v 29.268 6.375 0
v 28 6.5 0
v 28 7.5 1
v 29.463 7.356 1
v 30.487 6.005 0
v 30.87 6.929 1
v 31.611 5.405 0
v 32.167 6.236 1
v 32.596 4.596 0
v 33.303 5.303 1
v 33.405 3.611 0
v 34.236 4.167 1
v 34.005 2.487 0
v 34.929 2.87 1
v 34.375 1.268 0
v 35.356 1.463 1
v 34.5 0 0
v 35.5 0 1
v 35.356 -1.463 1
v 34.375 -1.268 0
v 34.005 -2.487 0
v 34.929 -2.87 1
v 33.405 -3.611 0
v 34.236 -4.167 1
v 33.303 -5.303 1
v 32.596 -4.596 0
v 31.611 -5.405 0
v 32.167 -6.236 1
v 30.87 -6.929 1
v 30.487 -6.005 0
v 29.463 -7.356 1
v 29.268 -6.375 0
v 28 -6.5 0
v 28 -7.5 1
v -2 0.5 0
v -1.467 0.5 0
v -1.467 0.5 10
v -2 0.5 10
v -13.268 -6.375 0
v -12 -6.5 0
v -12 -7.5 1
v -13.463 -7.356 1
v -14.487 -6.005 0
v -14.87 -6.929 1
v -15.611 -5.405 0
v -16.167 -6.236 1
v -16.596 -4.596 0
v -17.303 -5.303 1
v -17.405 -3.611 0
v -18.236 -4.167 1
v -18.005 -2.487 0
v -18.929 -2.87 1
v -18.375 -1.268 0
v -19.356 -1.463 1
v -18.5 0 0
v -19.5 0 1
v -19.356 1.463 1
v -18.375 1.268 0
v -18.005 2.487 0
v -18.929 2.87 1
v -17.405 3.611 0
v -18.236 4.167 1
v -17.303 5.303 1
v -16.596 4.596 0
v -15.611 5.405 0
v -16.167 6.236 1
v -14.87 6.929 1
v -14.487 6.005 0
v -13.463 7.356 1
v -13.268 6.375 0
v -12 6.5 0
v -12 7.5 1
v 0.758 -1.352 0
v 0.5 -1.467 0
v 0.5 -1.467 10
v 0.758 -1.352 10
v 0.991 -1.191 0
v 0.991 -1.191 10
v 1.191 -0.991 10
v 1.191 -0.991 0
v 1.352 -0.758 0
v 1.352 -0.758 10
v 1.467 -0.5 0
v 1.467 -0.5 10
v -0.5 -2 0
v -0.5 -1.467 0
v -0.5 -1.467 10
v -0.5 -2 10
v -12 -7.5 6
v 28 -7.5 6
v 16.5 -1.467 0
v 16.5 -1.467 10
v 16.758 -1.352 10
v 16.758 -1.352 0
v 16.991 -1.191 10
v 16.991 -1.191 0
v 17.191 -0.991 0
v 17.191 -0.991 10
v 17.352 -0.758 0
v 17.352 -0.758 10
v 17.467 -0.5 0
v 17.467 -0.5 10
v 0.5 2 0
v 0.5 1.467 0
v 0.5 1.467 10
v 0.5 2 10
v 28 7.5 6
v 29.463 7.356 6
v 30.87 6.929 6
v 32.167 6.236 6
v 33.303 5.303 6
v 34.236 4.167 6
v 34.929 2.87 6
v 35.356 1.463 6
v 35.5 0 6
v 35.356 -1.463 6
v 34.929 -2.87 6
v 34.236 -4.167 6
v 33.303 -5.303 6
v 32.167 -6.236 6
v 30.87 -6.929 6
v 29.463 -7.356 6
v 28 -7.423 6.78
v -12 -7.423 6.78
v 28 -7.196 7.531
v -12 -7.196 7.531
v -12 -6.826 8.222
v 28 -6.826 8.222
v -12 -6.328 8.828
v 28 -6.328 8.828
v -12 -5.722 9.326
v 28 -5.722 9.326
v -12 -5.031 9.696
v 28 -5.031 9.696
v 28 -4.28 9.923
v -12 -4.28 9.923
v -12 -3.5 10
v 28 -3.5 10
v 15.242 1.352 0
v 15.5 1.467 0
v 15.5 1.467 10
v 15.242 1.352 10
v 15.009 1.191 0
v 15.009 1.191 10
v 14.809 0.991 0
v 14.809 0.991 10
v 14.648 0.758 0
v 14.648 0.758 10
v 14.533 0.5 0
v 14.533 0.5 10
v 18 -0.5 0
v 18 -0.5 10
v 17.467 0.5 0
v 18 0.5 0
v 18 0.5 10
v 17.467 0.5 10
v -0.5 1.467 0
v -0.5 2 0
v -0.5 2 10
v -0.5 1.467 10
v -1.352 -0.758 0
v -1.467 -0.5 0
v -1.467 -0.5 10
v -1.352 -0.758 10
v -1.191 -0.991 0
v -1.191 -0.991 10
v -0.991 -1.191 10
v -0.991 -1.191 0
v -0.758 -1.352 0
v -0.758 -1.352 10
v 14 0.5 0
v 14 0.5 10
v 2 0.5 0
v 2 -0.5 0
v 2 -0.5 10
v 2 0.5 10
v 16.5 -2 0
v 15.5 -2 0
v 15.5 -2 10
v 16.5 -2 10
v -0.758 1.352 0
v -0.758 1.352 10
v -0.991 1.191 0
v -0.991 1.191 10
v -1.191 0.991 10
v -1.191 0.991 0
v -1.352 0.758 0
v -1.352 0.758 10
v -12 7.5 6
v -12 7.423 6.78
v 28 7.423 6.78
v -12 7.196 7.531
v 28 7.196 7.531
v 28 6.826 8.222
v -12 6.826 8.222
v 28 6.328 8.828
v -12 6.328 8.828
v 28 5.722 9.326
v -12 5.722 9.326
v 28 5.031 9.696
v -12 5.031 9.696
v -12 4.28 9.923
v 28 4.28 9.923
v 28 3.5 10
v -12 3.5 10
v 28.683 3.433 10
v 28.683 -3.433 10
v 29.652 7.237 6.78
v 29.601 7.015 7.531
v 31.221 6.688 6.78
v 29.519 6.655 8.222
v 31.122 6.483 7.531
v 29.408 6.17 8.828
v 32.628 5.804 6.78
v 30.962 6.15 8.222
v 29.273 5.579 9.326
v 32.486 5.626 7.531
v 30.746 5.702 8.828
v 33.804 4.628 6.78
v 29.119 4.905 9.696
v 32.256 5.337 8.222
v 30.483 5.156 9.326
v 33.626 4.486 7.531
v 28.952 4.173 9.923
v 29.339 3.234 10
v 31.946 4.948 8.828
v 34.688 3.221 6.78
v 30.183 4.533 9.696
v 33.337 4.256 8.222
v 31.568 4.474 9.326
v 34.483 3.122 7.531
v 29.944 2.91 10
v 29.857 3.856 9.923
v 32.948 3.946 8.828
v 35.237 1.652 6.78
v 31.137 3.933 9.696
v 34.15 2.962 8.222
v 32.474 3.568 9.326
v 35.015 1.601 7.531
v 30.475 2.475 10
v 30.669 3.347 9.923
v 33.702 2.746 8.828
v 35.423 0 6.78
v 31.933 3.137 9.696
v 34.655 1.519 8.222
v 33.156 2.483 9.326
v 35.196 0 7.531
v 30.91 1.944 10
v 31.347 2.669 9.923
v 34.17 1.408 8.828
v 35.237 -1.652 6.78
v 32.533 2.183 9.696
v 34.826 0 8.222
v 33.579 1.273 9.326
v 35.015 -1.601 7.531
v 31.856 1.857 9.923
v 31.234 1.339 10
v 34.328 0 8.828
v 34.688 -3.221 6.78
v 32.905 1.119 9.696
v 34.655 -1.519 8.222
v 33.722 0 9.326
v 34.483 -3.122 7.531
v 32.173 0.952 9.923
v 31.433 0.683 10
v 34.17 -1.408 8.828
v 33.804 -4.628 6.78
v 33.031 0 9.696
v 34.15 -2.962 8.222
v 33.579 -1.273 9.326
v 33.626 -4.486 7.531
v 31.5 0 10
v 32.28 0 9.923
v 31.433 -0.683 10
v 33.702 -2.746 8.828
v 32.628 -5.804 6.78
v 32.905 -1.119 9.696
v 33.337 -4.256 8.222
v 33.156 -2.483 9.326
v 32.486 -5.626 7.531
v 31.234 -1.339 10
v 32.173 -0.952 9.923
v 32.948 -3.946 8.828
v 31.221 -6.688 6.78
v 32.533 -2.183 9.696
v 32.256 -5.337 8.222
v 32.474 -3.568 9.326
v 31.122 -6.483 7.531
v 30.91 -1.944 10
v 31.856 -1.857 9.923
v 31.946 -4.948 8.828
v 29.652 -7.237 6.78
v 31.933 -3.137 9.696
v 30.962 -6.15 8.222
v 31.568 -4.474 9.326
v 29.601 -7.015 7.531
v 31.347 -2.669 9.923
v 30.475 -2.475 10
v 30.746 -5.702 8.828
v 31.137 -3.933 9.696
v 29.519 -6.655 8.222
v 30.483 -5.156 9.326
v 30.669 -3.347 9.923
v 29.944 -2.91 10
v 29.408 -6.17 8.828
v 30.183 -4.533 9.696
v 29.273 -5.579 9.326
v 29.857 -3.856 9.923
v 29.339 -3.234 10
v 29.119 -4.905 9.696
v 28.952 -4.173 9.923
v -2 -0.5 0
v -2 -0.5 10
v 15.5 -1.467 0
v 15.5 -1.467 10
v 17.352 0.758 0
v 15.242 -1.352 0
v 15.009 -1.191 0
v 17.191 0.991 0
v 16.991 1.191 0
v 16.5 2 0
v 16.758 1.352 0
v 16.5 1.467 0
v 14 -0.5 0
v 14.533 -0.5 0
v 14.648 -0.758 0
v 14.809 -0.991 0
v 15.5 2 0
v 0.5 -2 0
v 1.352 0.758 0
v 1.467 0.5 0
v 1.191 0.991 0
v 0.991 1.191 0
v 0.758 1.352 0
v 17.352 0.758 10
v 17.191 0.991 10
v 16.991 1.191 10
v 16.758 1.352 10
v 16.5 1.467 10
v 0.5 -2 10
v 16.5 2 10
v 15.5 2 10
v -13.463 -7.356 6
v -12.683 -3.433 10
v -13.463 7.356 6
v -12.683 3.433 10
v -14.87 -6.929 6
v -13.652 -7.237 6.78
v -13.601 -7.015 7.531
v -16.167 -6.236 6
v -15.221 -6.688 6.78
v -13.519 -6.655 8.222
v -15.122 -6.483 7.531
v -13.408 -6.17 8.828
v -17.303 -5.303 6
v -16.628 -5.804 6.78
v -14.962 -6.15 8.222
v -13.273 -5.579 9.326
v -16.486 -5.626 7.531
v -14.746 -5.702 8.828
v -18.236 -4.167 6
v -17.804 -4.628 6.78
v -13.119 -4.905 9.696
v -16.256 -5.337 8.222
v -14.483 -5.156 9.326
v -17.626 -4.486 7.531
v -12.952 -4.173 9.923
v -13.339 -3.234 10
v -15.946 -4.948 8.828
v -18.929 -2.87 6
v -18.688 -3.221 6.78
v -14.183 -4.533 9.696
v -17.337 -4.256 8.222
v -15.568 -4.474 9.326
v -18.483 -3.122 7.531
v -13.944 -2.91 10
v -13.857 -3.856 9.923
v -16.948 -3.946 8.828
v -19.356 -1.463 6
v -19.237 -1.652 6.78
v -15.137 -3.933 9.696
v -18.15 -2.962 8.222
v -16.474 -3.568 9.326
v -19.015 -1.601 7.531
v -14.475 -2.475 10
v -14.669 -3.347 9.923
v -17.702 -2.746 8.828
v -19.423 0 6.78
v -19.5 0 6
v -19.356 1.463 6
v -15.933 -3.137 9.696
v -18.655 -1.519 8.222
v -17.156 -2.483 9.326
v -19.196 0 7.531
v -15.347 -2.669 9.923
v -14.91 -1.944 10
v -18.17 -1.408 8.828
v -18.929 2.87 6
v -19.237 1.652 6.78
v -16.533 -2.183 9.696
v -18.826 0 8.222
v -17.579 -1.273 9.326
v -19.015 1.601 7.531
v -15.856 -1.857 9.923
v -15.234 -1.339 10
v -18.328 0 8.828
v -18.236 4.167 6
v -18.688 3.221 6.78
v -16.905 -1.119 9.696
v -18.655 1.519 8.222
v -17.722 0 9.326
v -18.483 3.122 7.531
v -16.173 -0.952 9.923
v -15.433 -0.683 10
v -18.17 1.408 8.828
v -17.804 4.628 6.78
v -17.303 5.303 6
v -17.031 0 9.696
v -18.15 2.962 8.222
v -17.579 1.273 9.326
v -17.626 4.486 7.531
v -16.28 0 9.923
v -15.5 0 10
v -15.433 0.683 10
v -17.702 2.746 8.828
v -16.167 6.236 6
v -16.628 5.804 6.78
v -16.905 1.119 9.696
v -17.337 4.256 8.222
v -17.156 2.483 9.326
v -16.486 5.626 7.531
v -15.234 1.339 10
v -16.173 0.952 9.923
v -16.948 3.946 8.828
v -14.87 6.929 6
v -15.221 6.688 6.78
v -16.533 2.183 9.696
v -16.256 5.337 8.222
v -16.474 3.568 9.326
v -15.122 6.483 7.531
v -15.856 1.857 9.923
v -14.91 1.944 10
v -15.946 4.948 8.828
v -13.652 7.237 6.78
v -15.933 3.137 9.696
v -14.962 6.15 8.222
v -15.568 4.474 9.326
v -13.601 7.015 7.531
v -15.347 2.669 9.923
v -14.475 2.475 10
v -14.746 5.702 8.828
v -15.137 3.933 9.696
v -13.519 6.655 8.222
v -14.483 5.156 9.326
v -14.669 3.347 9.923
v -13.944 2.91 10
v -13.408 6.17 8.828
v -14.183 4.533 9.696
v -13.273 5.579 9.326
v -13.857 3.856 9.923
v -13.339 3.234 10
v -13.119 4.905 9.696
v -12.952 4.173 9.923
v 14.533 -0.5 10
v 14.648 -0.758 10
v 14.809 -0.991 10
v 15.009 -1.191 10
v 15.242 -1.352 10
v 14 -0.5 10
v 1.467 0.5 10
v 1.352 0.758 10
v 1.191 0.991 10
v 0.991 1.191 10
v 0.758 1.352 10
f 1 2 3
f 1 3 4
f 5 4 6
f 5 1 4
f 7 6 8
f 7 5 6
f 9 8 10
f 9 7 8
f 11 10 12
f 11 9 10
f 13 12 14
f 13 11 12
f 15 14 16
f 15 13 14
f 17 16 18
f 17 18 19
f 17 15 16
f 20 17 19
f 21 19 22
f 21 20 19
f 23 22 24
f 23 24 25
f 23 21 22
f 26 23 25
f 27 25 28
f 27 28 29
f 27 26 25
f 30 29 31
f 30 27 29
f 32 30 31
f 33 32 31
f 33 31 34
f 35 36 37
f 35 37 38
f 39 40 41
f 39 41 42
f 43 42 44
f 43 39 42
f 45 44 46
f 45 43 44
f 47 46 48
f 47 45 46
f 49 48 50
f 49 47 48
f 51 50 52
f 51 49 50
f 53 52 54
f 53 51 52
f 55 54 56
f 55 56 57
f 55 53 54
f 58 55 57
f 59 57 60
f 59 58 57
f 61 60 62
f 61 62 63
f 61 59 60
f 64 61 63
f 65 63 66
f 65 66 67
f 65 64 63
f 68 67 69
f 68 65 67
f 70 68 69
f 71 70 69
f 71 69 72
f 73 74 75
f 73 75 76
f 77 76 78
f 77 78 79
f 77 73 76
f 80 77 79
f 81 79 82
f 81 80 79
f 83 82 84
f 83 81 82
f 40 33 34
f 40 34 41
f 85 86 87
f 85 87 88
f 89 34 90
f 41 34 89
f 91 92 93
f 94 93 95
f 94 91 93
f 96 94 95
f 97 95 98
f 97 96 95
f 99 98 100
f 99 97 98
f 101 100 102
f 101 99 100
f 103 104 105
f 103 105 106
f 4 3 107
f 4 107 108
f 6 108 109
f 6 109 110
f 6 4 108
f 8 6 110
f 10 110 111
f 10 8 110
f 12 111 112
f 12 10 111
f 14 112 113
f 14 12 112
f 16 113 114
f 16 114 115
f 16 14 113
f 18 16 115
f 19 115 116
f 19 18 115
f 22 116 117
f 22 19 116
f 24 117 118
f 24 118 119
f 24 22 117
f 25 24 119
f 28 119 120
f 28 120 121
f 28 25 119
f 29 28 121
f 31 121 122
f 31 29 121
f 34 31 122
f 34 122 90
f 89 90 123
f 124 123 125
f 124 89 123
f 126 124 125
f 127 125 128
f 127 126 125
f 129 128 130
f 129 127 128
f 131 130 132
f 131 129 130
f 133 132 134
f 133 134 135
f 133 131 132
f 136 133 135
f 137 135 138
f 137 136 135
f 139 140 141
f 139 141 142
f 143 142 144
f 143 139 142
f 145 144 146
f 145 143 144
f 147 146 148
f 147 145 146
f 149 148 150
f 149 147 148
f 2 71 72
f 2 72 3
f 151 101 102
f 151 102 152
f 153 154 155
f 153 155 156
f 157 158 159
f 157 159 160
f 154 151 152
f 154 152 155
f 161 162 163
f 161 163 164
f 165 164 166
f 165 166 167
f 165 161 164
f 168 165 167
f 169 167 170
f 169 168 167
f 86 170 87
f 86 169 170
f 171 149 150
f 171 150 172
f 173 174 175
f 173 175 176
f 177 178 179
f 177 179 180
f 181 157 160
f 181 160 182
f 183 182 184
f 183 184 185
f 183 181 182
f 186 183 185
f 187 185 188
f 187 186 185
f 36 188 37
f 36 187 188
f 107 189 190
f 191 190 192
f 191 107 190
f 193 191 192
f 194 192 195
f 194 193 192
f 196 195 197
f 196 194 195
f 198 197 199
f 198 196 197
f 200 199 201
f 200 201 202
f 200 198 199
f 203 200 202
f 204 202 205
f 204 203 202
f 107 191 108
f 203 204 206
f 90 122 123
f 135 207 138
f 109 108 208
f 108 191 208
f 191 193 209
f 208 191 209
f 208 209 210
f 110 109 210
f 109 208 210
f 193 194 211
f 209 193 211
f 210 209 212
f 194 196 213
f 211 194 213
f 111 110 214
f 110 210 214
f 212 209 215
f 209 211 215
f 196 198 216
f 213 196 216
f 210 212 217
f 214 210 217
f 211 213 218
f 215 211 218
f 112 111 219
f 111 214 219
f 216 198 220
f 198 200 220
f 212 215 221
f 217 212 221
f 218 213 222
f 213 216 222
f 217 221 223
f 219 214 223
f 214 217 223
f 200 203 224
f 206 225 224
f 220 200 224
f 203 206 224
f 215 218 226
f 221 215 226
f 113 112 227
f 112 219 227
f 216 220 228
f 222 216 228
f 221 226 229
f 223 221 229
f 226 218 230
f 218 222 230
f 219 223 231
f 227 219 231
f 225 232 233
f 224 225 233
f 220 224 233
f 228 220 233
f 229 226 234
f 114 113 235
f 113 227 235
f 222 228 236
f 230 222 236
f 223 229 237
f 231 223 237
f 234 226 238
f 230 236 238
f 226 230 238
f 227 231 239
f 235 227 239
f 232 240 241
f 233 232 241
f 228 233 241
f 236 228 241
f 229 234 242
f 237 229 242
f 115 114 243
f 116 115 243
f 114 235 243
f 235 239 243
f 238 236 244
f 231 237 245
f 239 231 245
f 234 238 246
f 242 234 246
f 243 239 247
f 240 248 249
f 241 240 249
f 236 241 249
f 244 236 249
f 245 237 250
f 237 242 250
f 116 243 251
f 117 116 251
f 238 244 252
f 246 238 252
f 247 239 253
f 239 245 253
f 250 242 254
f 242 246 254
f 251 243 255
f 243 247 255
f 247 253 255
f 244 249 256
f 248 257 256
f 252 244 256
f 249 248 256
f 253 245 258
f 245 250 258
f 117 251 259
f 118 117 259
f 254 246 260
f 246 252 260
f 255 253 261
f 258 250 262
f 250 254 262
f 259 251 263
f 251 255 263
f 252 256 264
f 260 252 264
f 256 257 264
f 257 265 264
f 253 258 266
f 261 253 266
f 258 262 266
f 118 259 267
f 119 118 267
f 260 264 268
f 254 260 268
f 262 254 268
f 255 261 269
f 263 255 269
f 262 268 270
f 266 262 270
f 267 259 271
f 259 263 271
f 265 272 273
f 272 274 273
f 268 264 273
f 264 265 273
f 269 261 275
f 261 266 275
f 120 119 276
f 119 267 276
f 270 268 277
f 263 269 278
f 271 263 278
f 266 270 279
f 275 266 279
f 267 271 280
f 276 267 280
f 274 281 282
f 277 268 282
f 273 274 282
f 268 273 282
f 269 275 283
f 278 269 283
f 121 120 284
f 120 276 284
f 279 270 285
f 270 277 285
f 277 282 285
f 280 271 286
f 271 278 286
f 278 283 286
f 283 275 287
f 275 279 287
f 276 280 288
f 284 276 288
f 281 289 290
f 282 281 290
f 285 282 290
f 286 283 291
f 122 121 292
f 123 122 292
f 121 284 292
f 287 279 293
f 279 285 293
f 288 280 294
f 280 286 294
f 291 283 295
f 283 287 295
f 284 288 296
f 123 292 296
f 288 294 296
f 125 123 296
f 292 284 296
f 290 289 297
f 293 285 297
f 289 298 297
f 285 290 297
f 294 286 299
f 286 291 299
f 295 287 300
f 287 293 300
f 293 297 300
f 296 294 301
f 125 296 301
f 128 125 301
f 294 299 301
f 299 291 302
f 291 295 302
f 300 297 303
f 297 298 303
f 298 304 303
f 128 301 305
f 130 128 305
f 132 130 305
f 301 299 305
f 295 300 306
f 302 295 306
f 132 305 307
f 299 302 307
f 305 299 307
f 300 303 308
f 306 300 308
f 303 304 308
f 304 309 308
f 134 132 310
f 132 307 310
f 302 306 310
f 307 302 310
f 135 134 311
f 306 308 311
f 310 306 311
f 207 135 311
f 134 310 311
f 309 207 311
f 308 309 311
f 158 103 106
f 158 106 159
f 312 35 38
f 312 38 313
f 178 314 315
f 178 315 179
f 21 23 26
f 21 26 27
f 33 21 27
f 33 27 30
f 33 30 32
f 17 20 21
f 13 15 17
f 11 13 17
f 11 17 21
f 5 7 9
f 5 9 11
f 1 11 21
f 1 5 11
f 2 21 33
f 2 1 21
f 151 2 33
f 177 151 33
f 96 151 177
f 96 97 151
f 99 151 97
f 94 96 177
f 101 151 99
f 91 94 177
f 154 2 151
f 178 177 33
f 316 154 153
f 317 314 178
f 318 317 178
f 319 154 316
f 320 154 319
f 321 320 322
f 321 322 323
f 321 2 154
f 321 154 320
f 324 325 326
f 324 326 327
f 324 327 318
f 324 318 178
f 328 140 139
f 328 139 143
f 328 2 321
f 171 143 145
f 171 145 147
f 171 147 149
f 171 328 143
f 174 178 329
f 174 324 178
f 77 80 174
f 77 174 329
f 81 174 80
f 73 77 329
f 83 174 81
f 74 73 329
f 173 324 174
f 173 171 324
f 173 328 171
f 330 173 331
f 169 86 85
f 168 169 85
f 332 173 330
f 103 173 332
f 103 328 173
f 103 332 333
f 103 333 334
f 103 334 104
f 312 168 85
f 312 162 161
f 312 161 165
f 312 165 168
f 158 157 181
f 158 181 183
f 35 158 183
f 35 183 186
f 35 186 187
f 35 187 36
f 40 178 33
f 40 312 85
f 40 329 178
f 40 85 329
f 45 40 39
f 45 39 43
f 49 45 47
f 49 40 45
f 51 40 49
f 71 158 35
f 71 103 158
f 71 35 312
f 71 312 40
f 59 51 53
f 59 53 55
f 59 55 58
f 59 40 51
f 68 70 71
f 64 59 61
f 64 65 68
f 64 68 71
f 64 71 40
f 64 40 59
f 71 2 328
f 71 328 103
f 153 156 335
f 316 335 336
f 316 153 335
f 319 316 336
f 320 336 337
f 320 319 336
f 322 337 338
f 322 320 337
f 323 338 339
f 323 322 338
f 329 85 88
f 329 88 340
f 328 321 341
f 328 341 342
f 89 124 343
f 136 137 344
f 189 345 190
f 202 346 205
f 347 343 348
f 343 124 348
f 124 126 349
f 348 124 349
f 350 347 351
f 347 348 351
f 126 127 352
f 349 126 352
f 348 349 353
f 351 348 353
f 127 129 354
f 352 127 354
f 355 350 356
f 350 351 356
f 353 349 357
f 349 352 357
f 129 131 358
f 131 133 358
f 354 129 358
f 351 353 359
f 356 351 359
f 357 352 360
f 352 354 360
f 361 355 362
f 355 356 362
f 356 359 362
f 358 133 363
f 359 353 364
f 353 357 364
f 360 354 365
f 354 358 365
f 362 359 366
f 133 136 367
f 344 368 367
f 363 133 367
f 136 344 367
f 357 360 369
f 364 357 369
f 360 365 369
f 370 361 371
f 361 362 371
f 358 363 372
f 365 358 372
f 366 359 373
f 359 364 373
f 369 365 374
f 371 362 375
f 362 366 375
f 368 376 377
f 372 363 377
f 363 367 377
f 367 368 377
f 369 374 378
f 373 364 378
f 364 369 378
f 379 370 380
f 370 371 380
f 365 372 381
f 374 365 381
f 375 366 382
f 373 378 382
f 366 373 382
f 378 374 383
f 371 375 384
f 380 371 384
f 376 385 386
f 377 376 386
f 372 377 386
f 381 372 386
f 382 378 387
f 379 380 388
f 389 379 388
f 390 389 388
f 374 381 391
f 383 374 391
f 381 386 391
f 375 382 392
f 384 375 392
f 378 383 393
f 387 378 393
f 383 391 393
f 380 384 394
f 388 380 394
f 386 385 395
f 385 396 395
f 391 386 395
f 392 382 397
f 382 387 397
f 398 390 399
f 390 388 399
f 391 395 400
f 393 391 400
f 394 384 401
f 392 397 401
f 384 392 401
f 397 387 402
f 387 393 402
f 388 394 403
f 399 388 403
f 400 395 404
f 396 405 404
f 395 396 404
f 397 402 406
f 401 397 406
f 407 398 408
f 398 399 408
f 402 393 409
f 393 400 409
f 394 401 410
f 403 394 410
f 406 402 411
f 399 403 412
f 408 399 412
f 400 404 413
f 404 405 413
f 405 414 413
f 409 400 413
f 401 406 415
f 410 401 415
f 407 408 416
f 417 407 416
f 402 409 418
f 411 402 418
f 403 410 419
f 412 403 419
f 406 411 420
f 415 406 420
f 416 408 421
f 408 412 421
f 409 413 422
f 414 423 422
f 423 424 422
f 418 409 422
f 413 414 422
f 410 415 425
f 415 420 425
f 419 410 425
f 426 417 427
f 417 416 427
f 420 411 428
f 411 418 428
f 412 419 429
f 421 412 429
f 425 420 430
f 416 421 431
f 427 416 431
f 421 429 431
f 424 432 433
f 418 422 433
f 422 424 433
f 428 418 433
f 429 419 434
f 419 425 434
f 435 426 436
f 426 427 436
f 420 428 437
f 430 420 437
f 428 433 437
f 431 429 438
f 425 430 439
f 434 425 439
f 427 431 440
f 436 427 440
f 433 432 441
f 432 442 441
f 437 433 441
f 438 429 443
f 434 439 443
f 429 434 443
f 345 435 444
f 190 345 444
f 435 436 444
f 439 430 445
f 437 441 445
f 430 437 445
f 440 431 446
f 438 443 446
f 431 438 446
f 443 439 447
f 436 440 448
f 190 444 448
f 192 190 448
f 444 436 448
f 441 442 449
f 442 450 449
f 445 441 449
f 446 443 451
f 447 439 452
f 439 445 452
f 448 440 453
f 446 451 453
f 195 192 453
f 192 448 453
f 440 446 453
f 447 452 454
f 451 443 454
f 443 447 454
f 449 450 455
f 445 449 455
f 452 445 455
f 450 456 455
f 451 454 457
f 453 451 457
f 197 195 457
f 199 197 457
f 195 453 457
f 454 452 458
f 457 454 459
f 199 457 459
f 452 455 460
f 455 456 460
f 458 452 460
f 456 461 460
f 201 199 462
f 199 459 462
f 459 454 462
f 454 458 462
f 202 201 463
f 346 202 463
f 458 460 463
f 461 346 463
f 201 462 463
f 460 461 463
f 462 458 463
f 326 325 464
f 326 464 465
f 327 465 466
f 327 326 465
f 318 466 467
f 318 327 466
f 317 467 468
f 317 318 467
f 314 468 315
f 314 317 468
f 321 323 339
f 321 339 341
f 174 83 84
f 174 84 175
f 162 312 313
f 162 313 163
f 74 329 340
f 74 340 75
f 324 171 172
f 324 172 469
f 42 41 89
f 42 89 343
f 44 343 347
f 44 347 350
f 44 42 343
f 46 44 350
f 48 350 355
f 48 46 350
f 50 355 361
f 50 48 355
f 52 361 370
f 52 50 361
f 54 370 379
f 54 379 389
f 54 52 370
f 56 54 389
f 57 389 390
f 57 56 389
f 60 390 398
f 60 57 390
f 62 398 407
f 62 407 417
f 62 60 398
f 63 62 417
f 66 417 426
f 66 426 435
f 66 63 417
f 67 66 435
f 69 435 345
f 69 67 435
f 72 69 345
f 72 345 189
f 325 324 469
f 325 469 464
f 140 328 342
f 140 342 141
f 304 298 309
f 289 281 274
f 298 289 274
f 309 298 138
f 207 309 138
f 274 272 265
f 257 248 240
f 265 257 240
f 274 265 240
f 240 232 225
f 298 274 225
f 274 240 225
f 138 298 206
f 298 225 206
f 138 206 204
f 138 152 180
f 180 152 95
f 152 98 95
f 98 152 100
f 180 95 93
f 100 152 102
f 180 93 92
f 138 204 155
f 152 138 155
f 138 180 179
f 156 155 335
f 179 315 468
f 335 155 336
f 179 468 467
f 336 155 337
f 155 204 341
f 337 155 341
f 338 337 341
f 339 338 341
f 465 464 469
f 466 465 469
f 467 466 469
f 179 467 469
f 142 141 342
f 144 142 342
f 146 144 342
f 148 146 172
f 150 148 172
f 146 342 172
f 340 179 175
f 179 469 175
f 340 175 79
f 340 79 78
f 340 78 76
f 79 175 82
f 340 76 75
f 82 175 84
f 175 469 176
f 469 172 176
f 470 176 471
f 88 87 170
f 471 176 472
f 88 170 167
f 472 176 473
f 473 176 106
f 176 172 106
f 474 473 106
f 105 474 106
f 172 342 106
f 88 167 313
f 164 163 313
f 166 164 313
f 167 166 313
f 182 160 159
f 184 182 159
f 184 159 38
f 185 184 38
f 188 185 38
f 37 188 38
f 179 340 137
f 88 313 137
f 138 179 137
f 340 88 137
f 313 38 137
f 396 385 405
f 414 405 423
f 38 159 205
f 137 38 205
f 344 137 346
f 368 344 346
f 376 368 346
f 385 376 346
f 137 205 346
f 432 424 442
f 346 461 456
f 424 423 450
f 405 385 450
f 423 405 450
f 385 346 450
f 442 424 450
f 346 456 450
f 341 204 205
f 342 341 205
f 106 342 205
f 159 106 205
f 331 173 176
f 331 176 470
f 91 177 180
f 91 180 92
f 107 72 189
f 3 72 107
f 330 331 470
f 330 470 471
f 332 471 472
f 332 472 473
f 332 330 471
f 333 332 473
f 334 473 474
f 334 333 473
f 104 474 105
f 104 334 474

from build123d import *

# Parameters (mm, degrees)
BOSS_EXTRUDE1_DEPTH = 10
FILLET1_R           = 4
CHAMFER1_SIZE       = 1


with BuildPart() as part:
    # Sketch1 → Boss-Extrude1 (new body)
    with BuildSketch(Plane.XY):
        with BuildLine():
            Line((-12, 7.5), (28, 7.5))
            ThreePointArc((28, 7.5), (35.5, 0), (28, -7.5))
            Line((28, -7.5), (-12, -7.5))
            ThreePointArc((-12, -7.5), (-19.5, 0), (-12, 7.5))
        make_face()
        with BuildLine():
            Line((-0.5, -2), (0.5, -2))
            Line((0.5, -2), (0.5, -1.467140075))
            ThreePointArc((0.5, -1.467140075), (1.096015511, -1.096015511), (1.467140075, -0.5))
            Line((1.467140075, -0.5), (2, -0.5))
            Line((2, -0.5), (2, 0.5))
            Line((2, 0.5), (1.467140075, 0.5))
            ThreePointArc((1.467140075, 0.5), (1.096015511, 1.096015511), (0.5, 1.467140075))
            Line((0.5, 1.467140075), (0.5, 2))
            Line((0.5, 2), (-0.5, 2))
            Line((-0.5, 2), (-0.5, 1.467140075))
            ThreePointArc((-0.5, 1.467140075), (-1.096015511, 1.096015511), (-1.467140075, 0.5))
            Line((-1.467140075, 0.5), (-2, 0.5))
            Line((-2, 0.5), (-2, -0.5))
            Line((-2, -0.5), (-1.467140075, -0.5))
            ThreePointArc((-1.467140075, -0.5), (-1.096015511, -1.096015511), (-0.5, -1.467140075))
            Line((-0.5, -1.467140075), (-0.5, -2))
        make_face(mode=Mode.SUBTRACT)
        with BuildLine():
            Line((18, -0.5), (18, 0.5))
            Line((18, 0.5), (17.467140075, 0.5))
            ThreePointArc((17.467140075, 0.5), (17.096015511, 1.096015511), (16.5, 1.467140075))
            Line((16.5, 1.467140075), (16.5, 2))
            Line((16.5, 2), (15.5, 2))
            Line((15.5, 2), (15.5, 1.467140075))
            ThreePointArc((15.5, 1.467140075), (14.903984489, 1.096015511), (14.532859925, 0.5))
            Line((14.532859925, 0.5), (14, 0.5))
            Line((14, 0.5), (14, -0.5))
            Line((14, -0.5), (14.532859925, -0.5))
            ThreePointArc((14.532859925, -0.5), (14.903984489, -1.096015511), (15.5, -1.467140075))
            Line((15.5, -1.467140075), (15.5, -2))
            Line((15.5, -2), (16.5, -2))
            Line((16.5, -2), (16.5, -1.467140075))
            ThreePointArc((16.5, -1.467140075), (17.096015511, -1.096015511), (17.467140075, -0.5))
            Line((17.467140075, -0.5), (18, -0.5))
        make_face(mode=Mode.SUBTRACT)
    extrude(amount=BOSS_EXTRUDE1_DEPTH)

    # Fillet1
    fillet1_edges = [part.edges().sort_by_distance(p)[0] for p in [
        (35.5, 0, 10),
        (8, 7.5, 10),
        (-19.5, 0, 10),
        (8, -7.5, 10),
    ]]
    fillet(fillet1_edges, radius=FILLET1_R)

    # Chamfer1
    chamfer1_edges = [part.edges().sort_by_distance(p)[0] for p in [
        (8, 7.5, 0),
        (35.5, 0, 0),
        (8, -7.5, 0),
        (-19.5, 0, 0),
    ]]
    chamfer(chamfer1_edges, length=CHAMFER1_SIZE)


solid = part.part
